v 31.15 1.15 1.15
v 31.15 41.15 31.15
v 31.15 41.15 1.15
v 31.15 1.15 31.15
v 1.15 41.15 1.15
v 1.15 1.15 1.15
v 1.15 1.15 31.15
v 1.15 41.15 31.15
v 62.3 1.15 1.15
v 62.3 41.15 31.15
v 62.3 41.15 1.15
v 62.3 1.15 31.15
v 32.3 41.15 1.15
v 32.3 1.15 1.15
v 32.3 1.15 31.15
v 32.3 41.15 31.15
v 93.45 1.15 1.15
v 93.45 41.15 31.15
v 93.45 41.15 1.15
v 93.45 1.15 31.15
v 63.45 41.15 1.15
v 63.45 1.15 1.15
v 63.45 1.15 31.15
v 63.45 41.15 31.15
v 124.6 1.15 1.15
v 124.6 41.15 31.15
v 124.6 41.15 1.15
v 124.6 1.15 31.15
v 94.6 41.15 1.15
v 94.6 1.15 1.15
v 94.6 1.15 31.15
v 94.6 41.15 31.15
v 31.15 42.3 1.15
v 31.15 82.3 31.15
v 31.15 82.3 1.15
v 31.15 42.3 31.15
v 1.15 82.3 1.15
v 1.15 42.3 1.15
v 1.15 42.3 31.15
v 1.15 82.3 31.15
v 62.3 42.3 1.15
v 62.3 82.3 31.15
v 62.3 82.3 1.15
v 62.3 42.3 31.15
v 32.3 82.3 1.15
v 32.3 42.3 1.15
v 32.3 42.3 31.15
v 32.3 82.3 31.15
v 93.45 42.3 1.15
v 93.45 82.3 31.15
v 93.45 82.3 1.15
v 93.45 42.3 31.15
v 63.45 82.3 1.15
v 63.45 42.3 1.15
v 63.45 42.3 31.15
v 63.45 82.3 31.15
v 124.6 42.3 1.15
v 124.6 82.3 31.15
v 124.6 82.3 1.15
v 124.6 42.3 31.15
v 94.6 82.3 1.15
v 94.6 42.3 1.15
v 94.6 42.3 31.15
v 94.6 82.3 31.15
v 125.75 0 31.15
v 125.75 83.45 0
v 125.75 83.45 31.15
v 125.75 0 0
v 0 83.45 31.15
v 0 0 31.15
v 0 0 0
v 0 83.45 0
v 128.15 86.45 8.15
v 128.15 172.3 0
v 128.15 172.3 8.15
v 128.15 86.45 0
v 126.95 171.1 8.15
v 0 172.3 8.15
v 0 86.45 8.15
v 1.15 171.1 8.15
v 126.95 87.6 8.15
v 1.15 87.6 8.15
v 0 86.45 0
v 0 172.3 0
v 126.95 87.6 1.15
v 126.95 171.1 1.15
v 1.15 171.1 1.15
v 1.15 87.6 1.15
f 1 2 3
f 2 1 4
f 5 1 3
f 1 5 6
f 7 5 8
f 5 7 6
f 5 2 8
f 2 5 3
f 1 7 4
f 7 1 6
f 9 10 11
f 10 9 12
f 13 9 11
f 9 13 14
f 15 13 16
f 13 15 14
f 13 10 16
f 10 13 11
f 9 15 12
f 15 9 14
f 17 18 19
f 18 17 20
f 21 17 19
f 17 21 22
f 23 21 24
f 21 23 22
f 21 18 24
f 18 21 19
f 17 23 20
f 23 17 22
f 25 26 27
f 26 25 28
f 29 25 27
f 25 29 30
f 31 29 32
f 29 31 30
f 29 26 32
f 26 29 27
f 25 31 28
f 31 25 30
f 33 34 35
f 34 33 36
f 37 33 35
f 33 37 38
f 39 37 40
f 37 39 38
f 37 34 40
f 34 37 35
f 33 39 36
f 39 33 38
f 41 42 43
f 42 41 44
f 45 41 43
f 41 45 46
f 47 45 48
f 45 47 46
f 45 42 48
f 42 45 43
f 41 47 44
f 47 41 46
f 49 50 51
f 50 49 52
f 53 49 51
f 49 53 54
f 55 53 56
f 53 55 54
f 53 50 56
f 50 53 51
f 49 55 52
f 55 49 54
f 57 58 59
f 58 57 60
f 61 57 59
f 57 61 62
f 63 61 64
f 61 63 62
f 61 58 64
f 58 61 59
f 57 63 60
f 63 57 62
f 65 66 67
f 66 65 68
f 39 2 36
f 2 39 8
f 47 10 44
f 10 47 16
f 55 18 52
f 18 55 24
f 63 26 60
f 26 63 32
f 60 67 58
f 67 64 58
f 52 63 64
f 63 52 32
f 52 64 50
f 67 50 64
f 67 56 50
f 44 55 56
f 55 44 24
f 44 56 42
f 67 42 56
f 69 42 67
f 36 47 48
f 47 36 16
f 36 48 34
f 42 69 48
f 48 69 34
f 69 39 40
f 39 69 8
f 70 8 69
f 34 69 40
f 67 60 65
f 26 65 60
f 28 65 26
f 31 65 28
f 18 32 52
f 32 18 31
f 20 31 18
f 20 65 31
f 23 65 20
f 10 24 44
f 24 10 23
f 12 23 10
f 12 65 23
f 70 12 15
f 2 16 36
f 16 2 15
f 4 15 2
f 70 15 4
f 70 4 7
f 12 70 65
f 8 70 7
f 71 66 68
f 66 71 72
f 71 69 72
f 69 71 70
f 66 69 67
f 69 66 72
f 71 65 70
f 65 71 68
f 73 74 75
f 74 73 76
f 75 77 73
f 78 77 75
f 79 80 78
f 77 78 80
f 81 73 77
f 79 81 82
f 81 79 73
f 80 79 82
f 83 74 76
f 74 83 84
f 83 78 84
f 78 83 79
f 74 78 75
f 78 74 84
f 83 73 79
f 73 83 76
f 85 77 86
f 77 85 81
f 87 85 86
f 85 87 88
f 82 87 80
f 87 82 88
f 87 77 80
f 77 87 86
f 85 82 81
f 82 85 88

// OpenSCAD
/* [Global] */


// Whether or not to generate the box
generate_box="yes";//[yes, no]

// Whether or not to generate the lid
generate_lid="yes";//[yes, no]

showlid = generate_lid=="yes"? true : false;

showbox = generate_box=="yes"? true : false;

Type_of_Lid = "Standard";//[Standard, Sliding]

lidtype = Type_of_Lid == "Standard"? 0 : 1;	// 0=Flat lid.  Use "1" for lid that slides off in the x direction


// Size of compartments, X
compx = 30;	


// Size of compartments, Y
compy = 40;	


// Width of wall, Make slightly larger then n*nozzle diameter. i.e. 1.15 for a 0.5 nozzle, should give a 2-pass thick wall
wall = 1.15;


// Number of compartments, X
nox = 4;


// Number of compartments, Y
noy = 2;



// Depth of compartments
deep = 30;	







// Tolerance around lid.  If it's too tight, increase this. If it's too loose, decrease it. 0.15 recommended for sliding lid
tolerance=.05;



// This is how far away from the box to print the lid
lidoffset=3;		


// How far the lid goes down the sides of the box. Only applies to Standard lid
lid_drop=7;
lidheight=lid_drop+wall;

//Adds a divit to sliding lid to make opening easer, no effect on standard lid
Thumb_Divit="yes"; //[yes, no]

includethumbhole = Thumb_Divit =="no"? false : true;


//Add a coin slot above every compartment
Coin_Slot="no"; //[yes, no]

includecoinslot=Coin_Slot == "no"? false: true;


//Size of Coin slot in X direction, default is slot thickness for United States Coins. Reverse X and Y to swap direction of slot
coinx=2.5;	
//Size of Coin slot in Y direction, default is slot width for United States Coins. Reverse X and Y to swap direction of slot
coiny=26;	



/* [Hidden] */

				// Z tolerance can be tweaked separately, to make the top of the sliding lid
				// be flush with the top of the box itself.  Default is zero.  Warning: this also
				// adds wiggle room to the lid.
                //Hidden from customizer, because more likely to mess up the box then help it.
ztolerance=0;

////////////////////
//start of objects
////////////////////

totalheight = deep + (lidtype*wall);
thumbrad = min(20,noy*(compy+wall)/3);

if (showbox) {
difference() {
	cube ( size = [nox * (compx + wall) + wall, noy * (compy + wall) + wall, (totalheight + wall)], center = false);


	for ( ybox = [ 0 : noy - 1])
		{
             for( xbox = [ 0 : nox - 1])
			{
			translate([ xbox * ( compx + wall ) + wall, ybox * ( compy + wall ) + wall, wall])
			cube ( size = [ compx, compy, totalheight+1 ]);
			}
		}
	if (lidtype==1) {
			translate ([0,wall/2,deep+wall]) 
			polyhedron ( points = [   
							[0,0,0], 
							[0,noy*(compy+wall),0], 
							[nox*(compx+wall)+wall/2,0,0], 
							[nox*(compx+wall)+wall/2,noy*(compy+wall),0],
							[0,wall/2,wall], 
							[0,noy*(compy+wall)-wall/2,wall], 
							[nox*(compx+wall)+wall/2,wall/2,wall], 
							[nox*(compx+wall)+wall/2,noy*(compy+wall)-wall/2,wall]
							],
						faces = [ 
							[0,2,1], [1,2,3], [4,5,6], [5,7,6]	,		// top and bottom
							[0,4,2], [4,6,2], [5,3,7], [5,1,3]	,		// angled sides
							[0,1,4], [1,5,4], [2,6,3], [3,6,7]			// trapezoidal ends
							]);
			translate ([0,wall/2,deep+wall-ztolerance])
			cube (size=[nox*(compx+wall)+wall/2,noy*(compy+wall),ztolerance],center=false);
			}

	}
}

if (showlid) {
translate ([0,noy*(compy+wall)+wall+lidoffset,0])
difference () { union () {	// for including coin slot
	if (lidtype==1) { 
		difference () {
		polyhedron ( points = [   
						[0,0,0], 
						[0,noy*(compy+wall)-2*tolerance,0], 
						[nox*(compx+wall)-tolerance+wall/2,0,0], 
						[nox*(compx+wall)-tolerance+wall/2,noy*(compy+wall)-2*tolerance,0],
						[0,wall/2,wall], 
						[0,noy*(compy+wall)-wall/2-2*tolerance,wall], 
						[nox*(compx+wall)-tolerance+wall/2,wall/2,wall], 
						[nox*(compx+wall)-tolerance+wall/2,noy*(compy+wall)-wall/2-2*tolerance,wall]
						],
					faces = [ 
						[0,2,1], [1,2,3], [4,5,6], [5,7,6]	,		// top and bottom
						[0,4,2], [4,6,2], [5,3,7], [5,1,3]	,		// angled sides
						[0,1,4], [1,5,4], [2,6,3], [3,6,7]			// trapezoidal ends
						]);
		// Thumb hole
		if (includethumbhole==true) {
			intersection () {
			translate ([min(8,nox*(compx+wall)/8),(noy*(compy+wall))/2,thumbrad+wall/2]) sphere (r=thumbrad, center=true, $fn=50);
			translate ([min(8,nox*(compx+wall)/8),0,0]) cube (size=[20,(noy*(compy+wall)),20], center=false);
		}
	}

		}
	} else {

	difference() {
	cube ( size = [nox * (compx + wall) + 3 * wall + 2* tolerance, noy * (compy + wall) + 3 * wall + 2*tolerance, lidheight], center = false);

	translate ([wall,wall,wall])
	cube ( size = [nox * (compx + wall) +wall+tolerance, noy * (compy + wall) + wall + tolerance, lidheight+1], center = false);
	}
} // if lidtype
} // union
if (includecoinslot==true) {
	for ( yslot = [ 0 : noy - 1])
		{
             for( xslot = [ 0 : nox - 1])
			{
			translate([ xslot * ( compx + wall ) + (2-lidtype)*wall + (compx-coinx)/2, yslot * ( compy + wall ) + wall*(2-3*lidtype/2) + (compy-coiny)/2, 0])
			cube ( size = [ coinx, coiny, wall ]);
			}
		}
	}
} //difference
} // if showlid
